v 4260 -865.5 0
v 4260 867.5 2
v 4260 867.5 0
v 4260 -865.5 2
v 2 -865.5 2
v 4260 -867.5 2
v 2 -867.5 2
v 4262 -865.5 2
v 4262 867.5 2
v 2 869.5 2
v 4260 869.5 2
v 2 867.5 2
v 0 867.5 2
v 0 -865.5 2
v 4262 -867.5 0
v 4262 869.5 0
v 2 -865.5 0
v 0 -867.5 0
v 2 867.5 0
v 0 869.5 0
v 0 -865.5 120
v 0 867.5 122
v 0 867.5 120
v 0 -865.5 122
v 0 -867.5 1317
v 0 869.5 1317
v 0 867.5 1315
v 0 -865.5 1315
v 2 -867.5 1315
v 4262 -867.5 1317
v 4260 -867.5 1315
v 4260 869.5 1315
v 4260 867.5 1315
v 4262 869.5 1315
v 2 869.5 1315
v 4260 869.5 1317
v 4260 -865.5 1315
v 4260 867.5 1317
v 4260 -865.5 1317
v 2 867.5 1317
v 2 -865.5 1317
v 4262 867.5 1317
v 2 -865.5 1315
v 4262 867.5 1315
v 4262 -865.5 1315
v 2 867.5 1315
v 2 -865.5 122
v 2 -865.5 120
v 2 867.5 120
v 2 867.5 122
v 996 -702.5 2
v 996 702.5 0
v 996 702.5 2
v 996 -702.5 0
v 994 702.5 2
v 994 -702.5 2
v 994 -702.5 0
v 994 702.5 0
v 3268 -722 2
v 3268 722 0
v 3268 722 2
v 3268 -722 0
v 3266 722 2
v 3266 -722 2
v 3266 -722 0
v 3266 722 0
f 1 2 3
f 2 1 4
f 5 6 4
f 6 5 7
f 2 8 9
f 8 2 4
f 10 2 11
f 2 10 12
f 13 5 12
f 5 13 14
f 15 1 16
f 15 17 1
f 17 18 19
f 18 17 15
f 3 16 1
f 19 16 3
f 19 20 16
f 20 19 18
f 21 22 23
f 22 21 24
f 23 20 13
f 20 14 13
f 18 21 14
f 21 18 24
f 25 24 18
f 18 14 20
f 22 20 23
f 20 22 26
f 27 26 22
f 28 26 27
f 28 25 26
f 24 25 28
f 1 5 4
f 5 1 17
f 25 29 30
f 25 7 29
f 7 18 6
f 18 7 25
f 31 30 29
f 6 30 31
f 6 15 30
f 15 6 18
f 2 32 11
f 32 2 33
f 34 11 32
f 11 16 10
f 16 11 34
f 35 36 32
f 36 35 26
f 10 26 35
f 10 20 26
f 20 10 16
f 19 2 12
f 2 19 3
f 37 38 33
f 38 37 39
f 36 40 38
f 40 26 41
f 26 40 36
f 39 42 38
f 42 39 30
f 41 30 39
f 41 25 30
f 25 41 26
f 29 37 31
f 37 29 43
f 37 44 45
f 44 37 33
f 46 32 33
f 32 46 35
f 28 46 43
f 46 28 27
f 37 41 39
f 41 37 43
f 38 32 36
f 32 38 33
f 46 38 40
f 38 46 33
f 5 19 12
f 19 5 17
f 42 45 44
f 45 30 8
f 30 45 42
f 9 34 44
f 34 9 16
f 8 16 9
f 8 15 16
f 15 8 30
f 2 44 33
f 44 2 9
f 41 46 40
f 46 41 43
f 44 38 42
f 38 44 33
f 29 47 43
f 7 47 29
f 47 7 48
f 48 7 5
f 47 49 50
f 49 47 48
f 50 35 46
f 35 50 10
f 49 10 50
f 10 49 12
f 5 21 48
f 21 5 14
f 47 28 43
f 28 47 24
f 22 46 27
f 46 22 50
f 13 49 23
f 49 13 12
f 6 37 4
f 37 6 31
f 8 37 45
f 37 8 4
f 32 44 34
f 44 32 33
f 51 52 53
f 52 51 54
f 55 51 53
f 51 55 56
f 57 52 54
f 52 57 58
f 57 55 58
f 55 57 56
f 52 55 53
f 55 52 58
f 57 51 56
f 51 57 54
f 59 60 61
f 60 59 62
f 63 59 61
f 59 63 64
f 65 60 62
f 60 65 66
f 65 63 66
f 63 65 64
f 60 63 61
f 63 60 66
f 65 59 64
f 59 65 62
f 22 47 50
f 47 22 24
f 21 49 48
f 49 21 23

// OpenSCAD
// Generated by scripts/generate_twin_envelope.py; edit the generator or source data.
// This is a reference envelope and datum cage, not a reconstructed Porsche body.
// Coordinate system: X front-to-rear, Y left/right about centreline, Z upward from ground.
// Axle positions are centred in the length only for visualisation; their overhangs are not sourced.

length_mm = 4260; // MNL-TECH-0022, PDF p.19
width_mm = 1735; // MNL-TECH-0023, PDF p.19
height_mm = 1315; // MNL-TECH-0024, PDF p.19
wheelbase_mm = 2272; // MNL-TECH-0026, PDF p.19
front_track_mm = 1405; // MNL-TECH-0027, PDF p.19
rear_track_mm = 1444; // MNL-TECH-0028, PDF p.19
ground_clearance_mm = 120; // MNL-TECH-0029, PDF p.19
display_beam_mm = 2; // visualisation thickness, not a vehicle dimension
front_axle_x = (length_mm - wheelbase_mm) / 2; // visualisation assumption
rear_axle_x = front_axle_x + wheelbase_mm; // visualisation assumption

module beam_x(x, y, z, length) {
    translate([x, y, z]) cube([length, display_beam_mm, display_beam_mm]);
}
module beam_y(x, y, z, length) {
    translate([x, y, z]) cube([display_beam_mm, length, display_beam_mm]);
}
module beam_z(x, y, z, length) {
    translate([x, y, z]) cube([display_beam_mm, display_beam_mm, length]);
}

module envelope_cage() {
    color([0.20, 0.55, 0.95, 0.35]) {
        for (z = [0, height_mm]) for (y = [-width_mm / 2, width_mm / 2])
            beam_x(0, y, z, length_mm);
        for (z = [0, height_mm]) for (x = [0, length_mm])
            beam_y(x, -width_mm / 2, z, width_mm);
        for (x = [0, length_mm]) for (y = [-width_mm / 2, width_mm / 2])
            beam_z(x, y, 0, height_mm);
    }
}

module datum_cage() {
    // The clearance line is a reference plane, not the underside of a body surface.
    color([1.00, 0.70, 0.10, 0.75])
        beam_y(0, -width_mm / 2, ground_clearance_mm, width_mm);
    color([0.90, 0.15, 0.15, 0.85]) {
        beam_y(front_axle_x, -front_track_mm / 2, 0, front_track_mm);
        beam_y(rear_axle_x, -rear_track_mm / 2, 0, rear_track_mm);
    }
}

envelope_cage();
datum_cage();
